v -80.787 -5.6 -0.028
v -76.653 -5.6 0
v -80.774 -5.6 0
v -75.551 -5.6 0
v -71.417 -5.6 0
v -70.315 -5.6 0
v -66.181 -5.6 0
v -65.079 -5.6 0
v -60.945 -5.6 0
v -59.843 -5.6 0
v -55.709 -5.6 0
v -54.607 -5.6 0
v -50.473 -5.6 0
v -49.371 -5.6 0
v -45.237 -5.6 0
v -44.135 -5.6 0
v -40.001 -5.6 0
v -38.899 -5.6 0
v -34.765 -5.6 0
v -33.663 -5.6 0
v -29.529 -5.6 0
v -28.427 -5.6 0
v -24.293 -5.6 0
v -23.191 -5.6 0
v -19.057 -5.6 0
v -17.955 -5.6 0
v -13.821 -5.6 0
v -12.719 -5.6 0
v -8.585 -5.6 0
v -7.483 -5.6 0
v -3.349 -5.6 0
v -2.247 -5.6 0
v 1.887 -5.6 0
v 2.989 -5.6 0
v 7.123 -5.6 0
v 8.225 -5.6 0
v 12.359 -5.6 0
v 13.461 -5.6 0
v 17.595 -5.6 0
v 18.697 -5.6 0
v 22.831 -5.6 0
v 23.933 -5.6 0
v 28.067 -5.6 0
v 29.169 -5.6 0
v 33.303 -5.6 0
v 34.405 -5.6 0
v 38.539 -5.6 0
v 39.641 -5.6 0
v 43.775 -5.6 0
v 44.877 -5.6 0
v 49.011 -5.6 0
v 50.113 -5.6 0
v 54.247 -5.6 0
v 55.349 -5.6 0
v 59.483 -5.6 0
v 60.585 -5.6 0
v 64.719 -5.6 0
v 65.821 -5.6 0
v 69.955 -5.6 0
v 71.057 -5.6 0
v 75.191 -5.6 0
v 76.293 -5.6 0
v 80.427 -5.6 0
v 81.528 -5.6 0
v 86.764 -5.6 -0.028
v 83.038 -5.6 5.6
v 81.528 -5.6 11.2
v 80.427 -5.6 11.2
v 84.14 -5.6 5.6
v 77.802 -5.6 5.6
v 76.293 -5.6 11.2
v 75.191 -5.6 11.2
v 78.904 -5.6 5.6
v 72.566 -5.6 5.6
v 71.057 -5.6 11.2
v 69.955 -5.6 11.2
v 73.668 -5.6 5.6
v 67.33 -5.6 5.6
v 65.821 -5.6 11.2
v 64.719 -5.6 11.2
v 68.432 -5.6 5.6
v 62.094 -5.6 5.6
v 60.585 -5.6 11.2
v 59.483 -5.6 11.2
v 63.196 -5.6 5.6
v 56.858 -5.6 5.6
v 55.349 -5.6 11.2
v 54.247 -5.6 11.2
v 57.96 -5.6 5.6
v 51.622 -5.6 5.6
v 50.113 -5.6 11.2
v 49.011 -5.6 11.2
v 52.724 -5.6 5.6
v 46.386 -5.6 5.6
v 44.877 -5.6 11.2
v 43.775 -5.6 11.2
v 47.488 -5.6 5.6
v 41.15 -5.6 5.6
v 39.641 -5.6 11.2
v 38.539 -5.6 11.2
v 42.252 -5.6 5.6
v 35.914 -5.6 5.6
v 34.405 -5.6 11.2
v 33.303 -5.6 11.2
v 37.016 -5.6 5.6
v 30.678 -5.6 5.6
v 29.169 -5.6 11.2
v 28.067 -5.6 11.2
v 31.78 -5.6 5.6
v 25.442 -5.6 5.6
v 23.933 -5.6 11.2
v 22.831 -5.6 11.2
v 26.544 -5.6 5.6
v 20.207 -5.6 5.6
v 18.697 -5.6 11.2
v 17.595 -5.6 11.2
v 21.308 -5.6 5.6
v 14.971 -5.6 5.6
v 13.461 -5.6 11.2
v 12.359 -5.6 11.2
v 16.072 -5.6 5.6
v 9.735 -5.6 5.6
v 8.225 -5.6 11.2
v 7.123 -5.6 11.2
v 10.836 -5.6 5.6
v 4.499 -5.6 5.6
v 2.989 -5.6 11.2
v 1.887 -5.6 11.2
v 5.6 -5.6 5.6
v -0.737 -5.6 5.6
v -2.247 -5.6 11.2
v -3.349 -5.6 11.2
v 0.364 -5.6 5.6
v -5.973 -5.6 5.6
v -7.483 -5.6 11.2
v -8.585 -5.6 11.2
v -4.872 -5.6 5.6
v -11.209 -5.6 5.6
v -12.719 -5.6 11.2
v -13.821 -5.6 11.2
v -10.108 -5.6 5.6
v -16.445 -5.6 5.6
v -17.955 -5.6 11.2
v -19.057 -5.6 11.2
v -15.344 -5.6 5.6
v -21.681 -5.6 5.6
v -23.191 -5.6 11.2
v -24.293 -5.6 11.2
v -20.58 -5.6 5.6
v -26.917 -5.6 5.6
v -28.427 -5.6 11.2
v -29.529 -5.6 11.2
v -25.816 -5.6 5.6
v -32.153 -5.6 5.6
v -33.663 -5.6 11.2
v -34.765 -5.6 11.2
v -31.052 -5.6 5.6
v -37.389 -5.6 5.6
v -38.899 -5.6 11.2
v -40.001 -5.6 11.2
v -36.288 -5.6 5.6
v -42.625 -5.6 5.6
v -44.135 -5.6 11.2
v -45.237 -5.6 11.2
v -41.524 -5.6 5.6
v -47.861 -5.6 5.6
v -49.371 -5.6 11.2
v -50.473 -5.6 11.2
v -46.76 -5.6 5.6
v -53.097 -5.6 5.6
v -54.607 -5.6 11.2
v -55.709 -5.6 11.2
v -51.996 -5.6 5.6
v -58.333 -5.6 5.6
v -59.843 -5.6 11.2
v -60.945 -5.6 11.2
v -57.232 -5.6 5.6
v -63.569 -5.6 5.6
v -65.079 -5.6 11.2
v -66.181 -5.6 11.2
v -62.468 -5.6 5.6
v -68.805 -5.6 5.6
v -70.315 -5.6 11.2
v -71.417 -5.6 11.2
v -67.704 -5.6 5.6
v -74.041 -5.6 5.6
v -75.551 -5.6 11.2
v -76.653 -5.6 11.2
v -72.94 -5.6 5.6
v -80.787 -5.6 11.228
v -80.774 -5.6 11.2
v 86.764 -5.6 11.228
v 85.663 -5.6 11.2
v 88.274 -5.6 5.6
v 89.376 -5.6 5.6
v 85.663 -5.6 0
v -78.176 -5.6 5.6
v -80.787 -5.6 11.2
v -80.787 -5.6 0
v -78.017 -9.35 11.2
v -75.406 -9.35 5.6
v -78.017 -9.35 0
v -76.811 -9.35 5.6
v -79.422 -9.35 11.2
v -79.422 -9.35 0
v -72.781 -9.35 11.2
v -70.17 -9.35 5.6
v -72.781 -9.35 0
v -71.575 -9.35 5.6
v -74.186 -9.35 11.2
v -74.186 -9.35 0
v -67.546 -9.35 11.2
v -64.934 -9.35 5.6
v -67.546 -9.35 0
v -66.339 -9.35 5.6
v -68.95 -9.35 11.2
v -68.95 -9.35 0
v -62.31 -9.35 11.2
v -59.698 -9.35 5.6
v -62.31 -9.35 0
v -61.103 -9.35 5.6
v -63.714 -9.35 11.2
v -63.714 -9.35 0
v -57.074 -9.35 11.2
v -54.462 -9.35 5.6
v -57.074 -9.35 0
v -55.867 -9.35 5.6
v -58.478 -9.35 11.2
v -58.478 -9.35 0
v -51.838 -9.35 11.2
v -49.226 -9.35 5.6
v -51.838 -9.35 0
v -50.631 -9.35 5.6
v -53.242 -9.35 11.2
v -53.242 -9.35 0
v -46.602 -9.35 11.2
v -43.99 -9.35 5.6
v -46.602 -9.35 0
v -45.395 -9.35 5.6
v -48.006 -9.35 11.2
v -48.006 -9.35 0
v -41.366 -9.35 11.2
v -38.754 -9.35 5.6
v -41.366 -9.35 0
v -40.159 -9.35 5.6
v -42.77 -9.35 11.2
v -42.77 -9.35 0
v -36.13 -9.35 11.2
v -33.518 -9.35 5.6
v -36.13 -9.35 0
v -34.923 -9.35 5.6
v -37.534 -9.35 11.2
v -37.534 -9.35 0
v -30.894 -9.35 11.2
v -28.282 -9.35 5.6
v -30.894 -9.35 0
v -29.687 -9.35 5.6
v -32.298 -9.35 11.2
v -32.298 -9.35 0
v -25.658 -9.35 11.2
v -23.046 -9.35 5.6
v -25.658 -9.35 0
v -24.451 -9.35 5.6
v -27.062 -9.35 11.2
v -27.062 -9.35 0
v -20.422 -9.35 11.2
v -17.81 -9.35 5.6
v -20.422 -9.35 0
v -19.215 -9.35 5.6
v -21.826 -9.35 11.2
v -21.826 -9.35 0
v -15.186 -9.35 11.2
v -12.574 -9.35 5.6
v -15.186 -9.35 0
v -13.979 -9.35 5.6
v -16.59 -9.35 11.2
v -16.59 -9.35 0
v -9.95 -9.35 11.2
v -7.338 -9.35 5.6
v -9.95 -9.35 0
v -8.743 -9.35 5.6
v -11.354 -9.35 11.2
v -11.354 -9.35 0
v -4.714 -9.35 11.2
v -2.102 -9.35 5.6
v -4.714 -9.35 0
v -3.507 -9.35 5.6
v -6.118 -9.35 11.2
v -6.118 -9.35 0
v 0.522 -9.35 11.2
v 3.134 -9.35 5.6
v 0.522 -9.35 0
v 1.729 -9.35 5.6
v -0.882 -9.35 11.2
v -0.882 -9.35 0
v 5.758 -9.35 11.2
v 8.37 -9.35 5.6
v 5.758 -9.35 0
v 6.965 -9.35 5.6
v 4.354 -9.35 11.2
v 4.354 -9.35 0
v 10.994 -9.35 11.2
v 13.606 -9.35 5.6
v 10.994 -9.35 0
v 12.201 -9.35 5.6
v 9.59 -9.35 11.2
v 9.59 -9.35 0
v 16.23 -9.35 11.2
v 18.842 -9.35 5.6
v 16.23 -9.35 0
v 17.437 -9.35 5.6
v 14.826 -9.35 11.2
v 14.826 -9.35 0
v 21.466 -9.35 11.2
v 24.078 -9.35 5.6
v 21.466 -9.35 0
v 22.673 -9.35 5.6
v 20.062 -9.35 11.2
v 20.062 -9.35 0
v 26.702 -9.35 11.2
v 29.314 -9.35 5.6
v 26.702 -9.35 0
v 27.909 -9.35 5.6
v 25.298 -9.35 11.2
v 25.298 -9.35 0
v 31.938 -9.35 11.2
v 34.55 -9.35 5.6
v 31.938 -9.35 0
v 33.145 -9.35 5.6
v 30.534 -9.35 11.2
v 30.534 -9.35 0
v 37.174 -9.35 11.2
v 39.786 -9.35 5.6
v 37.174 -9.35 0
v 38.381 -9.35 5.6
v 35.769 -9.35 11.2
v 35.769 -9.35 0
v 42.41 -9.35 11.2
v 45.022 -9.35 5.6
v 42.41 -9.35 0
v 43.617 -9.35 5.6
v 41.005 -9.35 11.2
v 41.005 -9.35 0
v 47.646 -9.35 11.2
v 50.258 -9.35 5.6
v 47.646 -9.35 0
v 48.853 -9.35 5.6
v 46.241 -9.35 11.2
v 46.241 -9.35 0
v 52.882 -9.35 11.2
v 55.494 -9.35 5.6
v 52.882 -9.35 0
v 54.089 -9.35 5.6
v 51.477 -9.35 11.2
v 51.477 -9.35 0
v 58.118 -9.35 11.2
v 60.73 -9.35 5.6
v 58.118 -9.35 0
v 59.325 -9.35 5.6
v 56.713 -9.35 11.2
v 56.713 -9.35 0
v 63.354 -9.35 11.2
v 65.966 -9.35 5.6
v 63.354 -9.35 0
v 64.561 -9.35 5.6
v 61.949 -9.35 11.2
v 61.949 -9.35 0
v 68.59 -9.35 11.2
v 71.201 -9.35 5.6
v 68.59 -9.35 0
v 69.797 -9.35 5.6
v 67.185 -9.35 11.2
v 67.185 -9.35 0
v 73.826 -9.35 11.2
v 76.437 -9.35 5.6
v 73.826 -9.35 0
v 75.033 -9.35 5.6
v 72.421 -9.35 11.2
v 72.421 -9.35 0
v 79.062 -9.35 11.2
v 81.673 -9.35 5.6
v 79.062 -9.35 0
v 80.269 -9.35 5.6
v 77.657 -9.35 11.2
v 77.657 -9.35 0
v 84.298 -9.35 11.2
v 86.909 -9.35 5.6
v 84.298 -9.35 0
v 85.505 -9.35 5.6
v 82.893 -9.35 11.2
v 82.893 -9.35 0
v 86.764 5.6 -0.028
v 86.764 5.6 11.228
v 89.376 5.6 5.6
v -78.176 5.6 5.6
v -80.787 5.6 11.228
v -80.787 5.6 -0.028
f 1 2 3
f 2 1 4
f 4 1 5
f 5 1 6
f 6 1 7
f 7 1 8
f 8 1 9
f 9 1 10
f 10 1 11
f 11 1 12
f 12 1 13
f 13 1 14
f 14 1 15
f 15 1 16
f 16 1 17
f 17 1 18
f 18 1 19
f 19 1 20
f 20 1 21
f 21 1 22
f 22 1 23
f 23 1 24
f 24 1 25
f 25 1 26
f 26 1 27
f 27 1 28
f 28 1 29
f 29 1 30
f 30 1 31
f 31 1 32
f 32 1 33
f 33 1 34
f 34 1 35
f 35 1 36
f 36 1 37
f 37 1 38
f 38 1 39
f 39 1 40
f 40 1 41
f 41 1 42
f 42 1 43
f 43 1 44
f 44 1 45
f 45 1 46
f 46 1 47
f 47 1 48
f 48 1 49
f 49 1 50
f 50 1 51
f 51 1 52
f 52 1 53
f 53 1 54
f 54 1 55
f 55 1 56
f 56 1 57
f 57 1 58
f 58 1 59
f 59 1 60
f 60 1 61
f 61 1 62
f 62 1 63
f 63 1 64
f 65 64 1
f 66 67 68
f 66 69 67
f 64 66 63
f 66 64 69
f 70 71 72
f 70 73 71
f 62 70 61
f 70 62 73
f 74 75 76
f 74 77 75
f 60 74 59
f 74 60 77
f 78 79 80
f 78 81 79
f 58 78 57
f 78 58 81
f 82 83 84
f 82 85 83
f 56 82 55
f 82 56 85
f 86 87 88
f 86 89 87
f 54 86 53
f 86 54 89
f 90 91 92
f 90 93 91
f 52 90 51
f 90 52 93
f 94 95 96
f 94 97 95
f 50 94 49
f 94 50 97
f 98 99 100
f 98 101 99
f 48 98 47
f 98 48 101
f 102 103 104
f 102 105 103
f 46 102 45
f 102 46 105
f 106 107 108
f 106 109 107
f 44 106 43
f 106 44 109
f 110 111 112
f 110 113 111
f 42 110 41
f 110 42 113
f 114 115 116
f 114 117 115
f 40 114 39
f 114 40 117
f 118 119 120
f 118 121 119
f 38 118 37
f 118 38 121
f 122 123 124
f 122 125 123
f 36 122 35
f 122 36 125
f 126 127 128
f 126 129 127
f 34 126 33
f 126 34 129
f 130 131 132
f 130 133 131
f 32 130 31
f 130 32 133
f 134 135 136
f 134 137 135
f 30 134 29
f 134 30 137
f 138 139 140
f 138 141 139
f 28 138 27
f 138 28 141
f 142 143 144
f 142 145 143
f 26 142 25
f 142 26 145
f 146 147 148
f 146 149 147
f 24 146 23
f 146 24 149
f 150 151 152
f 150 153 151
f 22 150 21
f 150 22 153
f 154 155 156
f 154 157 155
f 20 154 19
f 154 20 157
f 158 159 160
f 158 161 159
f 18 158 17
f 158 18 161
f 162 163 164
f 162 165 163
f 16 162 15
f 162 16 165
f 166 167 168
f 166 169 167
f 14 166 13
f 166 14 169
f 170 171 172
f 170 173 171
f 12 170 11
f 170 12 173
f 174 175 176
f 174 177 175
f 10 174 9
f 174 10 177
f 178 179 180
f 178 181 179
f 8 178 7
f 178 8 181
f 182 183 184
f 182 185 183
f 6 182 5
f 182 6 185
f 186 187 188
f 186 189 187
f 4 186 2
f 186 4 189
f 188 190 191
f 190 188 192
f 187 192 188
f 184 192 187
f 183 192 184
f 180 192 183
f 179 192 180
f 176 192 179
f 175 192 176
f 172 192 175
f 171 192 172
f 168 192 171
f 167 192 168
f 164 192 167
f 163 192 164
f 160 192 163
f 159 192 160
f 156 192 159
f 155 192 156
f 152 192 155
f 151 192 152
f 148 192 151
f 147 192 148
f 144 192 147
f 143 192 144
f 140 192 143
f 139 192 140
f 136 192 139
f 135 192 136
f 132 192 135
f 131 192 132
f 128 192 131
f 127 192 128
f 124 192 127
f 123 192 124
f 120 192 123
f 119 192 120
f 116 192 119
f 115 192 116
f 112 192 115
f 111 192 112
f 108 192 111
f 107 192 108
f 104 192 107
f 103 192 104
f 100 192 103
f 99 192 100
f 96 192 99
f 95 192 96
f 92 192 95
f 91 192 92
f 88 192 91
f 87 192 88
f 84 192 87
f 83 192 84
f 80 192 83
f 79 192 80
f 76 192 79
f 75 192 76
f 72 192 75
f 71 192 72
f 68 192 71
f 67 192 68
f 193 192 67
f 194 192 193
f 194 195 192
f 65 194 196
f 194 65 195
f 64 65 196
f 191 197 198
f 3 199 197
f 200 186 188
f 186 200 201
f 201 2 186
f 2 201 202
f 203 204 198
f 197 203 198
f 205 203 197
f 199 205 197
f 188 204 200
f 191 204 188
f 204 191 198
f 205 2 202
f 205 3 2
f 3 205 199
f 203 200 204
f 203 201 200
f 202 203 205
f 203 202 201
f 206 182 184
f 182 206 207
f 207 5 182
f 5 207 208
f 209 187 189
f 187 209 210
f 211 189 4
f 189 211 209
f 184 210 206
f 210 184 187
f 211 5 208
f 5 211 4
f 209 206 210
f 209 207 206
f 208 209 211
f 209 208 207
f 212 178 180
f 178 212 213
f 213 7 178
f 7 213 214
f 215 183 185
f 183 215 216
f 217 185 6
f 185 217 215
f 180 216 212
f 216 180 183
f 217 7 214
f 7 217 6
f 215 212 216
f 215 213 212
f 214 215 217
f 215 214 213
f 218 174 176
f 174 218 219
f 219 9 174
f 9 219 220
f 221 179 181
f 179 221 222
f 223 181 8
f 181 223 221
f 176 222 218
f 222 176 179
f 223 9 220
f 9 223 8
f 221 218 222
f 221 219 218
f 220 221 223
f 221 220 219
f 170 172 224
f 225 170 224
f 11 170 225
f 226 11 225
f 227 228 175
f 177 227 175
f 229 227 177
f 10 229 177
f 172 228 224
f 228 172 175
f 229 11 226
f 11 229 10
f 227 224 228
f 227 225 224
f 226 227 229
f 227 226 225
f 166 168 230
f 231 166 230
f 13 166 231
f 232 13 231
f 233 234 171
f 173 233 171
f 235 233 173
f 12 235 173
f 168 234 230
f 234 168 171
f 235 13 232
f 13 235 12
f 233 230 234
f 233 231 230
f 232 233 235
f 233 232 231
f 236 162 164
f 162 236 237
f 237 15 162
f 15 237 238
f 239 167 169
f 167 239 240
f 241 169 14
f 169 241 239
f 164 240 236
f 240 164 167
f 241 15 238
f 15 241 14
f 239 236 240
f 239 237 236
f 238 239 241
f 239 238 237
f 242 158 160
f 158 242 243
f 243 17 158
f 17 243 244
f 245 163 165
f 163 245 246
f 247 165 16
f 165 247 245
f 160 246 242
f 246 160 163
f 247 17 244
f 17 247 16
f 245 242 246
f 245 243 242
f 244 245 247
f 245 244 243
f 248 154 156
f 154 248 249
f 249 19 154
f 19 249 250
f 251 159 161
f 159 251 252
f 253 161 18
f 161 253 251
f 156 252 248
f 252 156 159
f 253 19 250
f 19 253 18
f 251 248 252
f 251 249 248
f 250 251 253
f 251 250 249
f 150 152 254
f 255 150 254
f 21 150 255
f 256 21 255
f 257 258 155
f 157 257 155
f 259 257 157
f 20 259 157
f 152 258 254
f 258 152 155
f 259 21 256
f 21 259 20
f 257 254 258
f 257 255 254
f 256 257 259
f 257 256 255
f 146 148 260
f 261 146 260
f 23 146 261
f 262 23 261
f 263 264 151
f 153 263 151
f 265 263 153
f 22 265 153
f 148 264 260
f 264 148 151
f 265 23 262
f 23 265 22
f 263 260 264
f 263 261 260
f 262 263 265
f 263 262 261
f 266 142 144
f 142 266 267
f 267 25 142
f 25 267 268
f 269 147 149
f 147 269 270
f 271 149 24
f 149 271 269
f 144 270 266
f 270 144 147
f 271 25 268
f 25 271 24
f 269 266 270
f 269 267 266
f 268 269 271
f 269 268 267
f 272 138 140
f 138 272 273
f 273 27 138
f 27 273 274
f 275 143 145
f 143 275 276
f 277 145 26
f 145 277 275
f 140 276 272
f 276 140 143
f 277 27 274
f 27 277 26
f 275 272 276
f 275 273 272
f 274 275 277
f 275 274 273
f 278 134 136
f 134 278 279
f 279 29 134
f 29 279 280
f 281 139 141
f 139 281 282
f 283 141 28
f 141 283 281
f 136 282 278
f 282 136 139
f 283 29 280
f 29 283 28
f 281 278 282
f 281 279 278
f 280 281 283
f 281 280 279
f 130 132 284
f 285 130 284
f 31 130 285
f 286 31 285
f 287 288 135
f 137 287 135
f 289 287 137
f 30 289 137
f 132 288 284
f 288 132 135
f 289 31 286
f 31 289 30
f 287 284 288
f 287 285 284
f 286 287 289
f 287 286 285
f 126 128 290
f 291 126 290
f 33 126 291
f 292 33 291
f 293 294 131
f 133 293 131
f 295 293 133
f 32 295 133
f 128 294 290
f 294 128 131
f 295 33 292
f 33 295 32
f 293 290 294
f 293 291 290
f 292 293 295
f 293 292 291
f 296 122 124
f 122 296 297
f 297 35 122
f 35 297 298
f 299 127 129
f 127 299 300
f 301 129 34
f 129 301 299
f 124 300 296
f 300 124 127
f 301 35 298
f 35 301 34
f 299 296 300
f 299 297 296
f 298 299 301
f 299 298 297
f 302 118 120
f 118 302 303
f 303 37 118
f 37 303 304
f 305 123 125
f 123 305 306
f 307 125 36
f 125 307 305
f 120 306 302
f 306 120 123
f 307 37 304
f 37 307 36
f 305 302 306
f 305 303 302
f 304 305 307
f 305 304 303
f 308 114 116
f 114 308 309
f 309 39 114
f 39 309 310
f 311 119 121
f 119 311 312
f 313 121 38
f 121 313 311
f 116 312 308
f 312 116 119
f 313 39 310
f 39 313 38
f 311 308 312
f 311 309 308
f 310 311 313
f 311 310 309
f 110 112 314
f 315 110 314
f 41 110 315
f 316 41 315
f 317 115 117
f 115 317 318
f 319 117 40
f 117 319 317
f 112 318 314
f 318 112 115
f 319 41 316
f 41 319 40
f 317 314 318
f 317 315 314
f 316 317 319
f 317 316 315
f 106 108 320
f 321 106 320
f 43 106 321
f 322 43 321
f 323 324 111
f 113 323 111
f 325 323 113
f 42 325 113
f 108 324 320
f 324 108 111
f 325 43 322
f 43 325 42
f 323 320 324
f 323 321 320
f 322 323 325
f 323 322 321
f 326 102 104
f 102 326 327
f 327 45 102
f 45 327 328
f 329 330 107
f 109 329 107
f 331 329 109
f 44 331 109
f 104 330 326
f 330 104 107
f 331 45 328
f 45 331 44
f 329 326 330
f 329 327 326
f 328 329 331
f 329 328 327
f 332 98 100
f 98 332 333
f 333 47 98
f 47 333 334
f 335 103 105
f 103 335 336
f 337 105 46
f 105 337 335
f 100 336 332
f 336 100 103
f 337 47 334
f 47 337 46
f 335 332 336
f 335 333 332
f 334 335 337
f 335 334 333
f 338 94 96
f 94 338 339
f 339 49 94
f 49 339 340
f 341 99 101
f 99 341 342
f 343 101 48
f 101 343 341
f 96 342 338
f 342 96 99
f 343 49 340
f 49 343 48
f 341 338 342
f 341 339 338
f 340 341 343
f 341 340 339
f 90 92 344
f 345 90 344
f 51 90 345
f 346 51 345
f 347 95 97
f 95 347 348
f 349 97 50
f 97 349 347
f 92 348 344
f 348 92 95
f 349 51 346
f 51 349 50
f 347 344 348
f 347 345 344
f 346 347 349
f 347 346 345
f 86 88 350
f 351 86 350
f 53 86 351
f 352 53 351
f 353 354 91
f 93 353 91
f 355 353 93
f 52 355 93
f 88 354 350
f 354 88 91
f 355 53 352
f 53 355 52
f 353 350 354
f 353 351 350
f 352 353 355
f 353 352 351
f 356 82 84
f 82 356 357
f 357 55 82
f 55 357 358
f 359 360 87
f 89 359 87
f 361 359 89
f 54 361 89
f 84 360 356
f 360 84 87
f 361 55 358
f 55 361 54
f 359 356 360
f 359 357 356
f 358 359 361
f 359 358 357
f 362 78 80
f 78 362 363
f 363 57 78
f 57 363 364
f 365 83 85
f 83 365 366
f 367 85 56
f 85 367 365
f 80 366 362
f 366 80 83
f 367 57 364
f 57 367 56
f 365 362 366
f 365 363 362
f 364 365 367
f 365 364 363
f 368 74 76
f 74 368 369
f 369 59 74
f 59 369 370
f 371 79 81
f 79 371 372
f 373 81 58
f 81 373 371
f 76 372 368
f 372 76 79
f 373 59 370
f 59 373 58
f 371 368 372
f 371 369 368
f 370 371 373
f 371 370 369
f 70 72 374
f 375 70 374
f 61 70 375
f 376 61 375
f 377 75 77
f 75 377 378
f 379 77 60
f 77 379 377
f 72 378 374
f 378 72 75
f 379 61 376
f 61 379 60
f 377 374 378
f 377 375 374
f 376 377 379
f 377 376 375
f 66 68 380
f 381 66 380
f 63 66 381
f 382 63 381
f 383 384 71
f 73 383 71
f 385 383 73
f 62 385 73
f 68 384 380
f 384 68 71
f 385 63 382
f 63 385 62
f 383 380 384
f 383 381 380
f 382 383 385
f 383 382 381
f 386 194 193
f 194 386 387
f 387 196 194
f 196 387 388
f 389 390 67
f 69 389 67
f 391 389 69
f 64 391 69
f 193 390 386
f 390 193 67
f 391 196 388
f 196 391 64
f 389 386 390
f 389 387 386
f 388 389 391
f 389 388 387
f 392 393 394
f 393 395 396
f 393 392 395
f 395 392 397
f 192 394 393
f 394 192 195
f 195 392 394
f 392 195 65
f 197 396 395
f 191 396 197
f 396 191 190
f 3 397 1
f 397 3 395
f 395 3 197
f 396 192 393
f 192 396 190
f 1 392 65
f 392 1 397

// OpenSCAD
// Parametric Modular Rack Mark "Ckaos" Moissette
//Based on the work of MattMoses and Fdavies :
//http://forums.reprap.org/read.php?1,51452,52099#msg-52099
//and Forrest Higgs:
// http://technocraticanarchist.blogspot.com/2010/01/high-speed-alternative-to-belts.html
//It is licensed under the Creative Commons - GNU GPL license.
// © 2011 by Mark "Ckaos" Moissette
//more info at :www.kaosat.net and
//http://www.thingiverse.com/thing:6011



pi=3.1415926535897932384626433832795;
innerRadius=3.1;//shaft radius, in mm
borders=2.5;//how thick should the borders around the central "shaft" be, in mm
diametralPitch=12;
numberOfTeeth=32;
pressureAngle=20*pi/180;
centerAngle=25;//angle at center of teeth


//example usage
rack(innerRadius,borders,diametralPitch,numberOfTeeth,pressureAngle,centerAngle);



module rack(innerRadius,borders,P,N,PA,CA)
{
	// P = diametral pitch
	// N = number of teeth
	// PA = pressure angle in radians
	// x, y = linear offset distances
	a = 1/P; // addendum (also known as "module")
	d = 1.25/P; // dedendum (this is set by a standard)
	multiplier=20;//20
	height=(d+a)*multiplier;
	
	
	// find the tangent of pressure angle once
	tanPA = tan(PA*(180/pi));
	// length of bottom and top horizontal segments of tooth profile
	botL = (pi/P/2 - 2*d*tanPA)*multiplier;
	topL =( pi/P/2 - 2*a*tanPA)*multiplier;

	slantLng=tanPA*height;
	realBase=2*slantLng+topL;
	
	
	offset=topL+botL+2*slantLng;
	length=(realBase+botL)*N;

	supportSize=(innerRadius+borders)*2;

	//calculate tooth params
	basesegmentL=realBase/2;
	basesegmentW=supportSize/2;

	topsegmentL=topL/2;
	topsegmentW=supportSize/2;

	baseoffsetY=tan(CA)*basesegmentW;
	topoffsetY=tan(CA)*topsegmentW;
	
	//calculate support params

	totalSupportLength=(N)*(offset);
	supportL=totalSupportLength/2;
	supportW=supportSize/1.99;
	
	echo("Total length",totalSupportLength+baseoffsetY);
	echo("Total height",supportSize);

	
	rotate([90,90,0])
	{
	translate([-supportSize/2,supportSize/2,0])
	{
	union()
	{
		
			support(supportL,supportW,supportSize,baseoffsetY);
			

	
		for (i = [0:N-1]) 
		{
			translate([0,i*offset-length/2+realBase/2,supportSize/2+height/2]) 
			{	
				
				tooth(basesegmentL,basesegmentW,topsegmentL,topsegmentW,height,baseoffsetY,topoffsetY);
				
			}
		}
	}
	
	}
	}
}

module support(supportL,supportW,height,offsetY)
{
	 tooth(supportL,supportW,supportL,supportW,height,offsetY,offsetY);
}



module tooth(basesegmentL,basesegmentW,topsegmentL,topsegmentW,height,baseoffsetY,topoffsetY)//top : width*length, same for base
{
	
	////////////////
	basePT1=[
	-basesegmentW,
	basesegmentL-baseoffsetY,
	-height/2];

	basePT2=[
	0,
	basesegmentL,
	-height/2];

	basePT3=[
	basesegmentW,
	basesegmentL-baseoffsetY,
	-height/2];

	basePT4=[
	basesegmentW,
	basesegmentL-(baseoffsetY+basesegmentL*2),
	-height/2];
	
	basePT5=[
	0,
	-basesegmentL,
	-height/2];

	basePT6=[
	-basesegmentW,
	basesegmentL-(baseoffsetY+basesegmentL*2),
	-height/2];
	//////////////////////////
	topPT1=[
	-topsegmentW,
	topsegmentL-topoffsetY,
	height/2];

	topPT2=[
	0,
	topsegmentL,
	height/2];

	topPT3=[
	topsegmentW,
	topsegmentL-topoffsetY,
	height/2];

	topPT4=[
	topsegmentW,
	topsegmentL-(topoffsetY+topsegmentL*2),
	height/2];
	
	topPT5=[
	0,
	-topsegmentL,
	height/2];

	topPT6=[
	-topsegmentW,
	topsegmentL-(topoffsetY+topsegmentL*2),
	height/2];
	//////////////////////////

	//////////////////////////

	polyhedron(
	points=[
		basePT1,
		basePT2,
		basePT3,
		basePT4,
		basePT5,
		basePT6,
		topPT1,
		topPT2,
		topPT3,
		topPT4,
		topPT5,
		topPT6],
	triangles=[
	//base
	[5,1,0],
	[4,1,5],
	[4,2,1],
	[3,2,4],	

	//front
	[1,6,0],
	[7,6,1],
	[2,7,1],
	[8,7,2],
	//back
	[11,10,5],
	[5,10,4],
	[10,9,4],
	[4,9,3],	
	//side 1
	[0,11,5],
	[6,11,0],
	//side 2
	[3,8,2],
	[9,8,3],
	//top
	[9,10,8],
	[10,7,8],
	[11,7,10],
	[6,7,11],
	]
	);
}

module demo_gear(position,diametralPitch)
{
	wheelSize=12;
rotate([0,90,180])
translate(position)

{
gear (
	number_of_teeth=8,
	circular_pitch=300, 
	pressure_angle=19.34,
	gear_thickness=wheelSize/2,
	rim_thickness=wheelSize/2,
	hub_thickness=0,
	bore_diameter=2,
	backlash=0,twist=centerAngle,involute_facets=15);

translate([0,0,wheelSize/2])
rotate([0,0,-centerAngle])
gear (
	number_of_teeth=8,
	circular_pitch=300, 
	pressure_angle=19.34,
	gear_thickness=wheelSize/2,
	rim_thickness=wheelSize/2,
	hub_thickness=0,
	bore_diameter=2,
	backlash=0,twist=-centerAngle,involute_facets=15);

}

}
